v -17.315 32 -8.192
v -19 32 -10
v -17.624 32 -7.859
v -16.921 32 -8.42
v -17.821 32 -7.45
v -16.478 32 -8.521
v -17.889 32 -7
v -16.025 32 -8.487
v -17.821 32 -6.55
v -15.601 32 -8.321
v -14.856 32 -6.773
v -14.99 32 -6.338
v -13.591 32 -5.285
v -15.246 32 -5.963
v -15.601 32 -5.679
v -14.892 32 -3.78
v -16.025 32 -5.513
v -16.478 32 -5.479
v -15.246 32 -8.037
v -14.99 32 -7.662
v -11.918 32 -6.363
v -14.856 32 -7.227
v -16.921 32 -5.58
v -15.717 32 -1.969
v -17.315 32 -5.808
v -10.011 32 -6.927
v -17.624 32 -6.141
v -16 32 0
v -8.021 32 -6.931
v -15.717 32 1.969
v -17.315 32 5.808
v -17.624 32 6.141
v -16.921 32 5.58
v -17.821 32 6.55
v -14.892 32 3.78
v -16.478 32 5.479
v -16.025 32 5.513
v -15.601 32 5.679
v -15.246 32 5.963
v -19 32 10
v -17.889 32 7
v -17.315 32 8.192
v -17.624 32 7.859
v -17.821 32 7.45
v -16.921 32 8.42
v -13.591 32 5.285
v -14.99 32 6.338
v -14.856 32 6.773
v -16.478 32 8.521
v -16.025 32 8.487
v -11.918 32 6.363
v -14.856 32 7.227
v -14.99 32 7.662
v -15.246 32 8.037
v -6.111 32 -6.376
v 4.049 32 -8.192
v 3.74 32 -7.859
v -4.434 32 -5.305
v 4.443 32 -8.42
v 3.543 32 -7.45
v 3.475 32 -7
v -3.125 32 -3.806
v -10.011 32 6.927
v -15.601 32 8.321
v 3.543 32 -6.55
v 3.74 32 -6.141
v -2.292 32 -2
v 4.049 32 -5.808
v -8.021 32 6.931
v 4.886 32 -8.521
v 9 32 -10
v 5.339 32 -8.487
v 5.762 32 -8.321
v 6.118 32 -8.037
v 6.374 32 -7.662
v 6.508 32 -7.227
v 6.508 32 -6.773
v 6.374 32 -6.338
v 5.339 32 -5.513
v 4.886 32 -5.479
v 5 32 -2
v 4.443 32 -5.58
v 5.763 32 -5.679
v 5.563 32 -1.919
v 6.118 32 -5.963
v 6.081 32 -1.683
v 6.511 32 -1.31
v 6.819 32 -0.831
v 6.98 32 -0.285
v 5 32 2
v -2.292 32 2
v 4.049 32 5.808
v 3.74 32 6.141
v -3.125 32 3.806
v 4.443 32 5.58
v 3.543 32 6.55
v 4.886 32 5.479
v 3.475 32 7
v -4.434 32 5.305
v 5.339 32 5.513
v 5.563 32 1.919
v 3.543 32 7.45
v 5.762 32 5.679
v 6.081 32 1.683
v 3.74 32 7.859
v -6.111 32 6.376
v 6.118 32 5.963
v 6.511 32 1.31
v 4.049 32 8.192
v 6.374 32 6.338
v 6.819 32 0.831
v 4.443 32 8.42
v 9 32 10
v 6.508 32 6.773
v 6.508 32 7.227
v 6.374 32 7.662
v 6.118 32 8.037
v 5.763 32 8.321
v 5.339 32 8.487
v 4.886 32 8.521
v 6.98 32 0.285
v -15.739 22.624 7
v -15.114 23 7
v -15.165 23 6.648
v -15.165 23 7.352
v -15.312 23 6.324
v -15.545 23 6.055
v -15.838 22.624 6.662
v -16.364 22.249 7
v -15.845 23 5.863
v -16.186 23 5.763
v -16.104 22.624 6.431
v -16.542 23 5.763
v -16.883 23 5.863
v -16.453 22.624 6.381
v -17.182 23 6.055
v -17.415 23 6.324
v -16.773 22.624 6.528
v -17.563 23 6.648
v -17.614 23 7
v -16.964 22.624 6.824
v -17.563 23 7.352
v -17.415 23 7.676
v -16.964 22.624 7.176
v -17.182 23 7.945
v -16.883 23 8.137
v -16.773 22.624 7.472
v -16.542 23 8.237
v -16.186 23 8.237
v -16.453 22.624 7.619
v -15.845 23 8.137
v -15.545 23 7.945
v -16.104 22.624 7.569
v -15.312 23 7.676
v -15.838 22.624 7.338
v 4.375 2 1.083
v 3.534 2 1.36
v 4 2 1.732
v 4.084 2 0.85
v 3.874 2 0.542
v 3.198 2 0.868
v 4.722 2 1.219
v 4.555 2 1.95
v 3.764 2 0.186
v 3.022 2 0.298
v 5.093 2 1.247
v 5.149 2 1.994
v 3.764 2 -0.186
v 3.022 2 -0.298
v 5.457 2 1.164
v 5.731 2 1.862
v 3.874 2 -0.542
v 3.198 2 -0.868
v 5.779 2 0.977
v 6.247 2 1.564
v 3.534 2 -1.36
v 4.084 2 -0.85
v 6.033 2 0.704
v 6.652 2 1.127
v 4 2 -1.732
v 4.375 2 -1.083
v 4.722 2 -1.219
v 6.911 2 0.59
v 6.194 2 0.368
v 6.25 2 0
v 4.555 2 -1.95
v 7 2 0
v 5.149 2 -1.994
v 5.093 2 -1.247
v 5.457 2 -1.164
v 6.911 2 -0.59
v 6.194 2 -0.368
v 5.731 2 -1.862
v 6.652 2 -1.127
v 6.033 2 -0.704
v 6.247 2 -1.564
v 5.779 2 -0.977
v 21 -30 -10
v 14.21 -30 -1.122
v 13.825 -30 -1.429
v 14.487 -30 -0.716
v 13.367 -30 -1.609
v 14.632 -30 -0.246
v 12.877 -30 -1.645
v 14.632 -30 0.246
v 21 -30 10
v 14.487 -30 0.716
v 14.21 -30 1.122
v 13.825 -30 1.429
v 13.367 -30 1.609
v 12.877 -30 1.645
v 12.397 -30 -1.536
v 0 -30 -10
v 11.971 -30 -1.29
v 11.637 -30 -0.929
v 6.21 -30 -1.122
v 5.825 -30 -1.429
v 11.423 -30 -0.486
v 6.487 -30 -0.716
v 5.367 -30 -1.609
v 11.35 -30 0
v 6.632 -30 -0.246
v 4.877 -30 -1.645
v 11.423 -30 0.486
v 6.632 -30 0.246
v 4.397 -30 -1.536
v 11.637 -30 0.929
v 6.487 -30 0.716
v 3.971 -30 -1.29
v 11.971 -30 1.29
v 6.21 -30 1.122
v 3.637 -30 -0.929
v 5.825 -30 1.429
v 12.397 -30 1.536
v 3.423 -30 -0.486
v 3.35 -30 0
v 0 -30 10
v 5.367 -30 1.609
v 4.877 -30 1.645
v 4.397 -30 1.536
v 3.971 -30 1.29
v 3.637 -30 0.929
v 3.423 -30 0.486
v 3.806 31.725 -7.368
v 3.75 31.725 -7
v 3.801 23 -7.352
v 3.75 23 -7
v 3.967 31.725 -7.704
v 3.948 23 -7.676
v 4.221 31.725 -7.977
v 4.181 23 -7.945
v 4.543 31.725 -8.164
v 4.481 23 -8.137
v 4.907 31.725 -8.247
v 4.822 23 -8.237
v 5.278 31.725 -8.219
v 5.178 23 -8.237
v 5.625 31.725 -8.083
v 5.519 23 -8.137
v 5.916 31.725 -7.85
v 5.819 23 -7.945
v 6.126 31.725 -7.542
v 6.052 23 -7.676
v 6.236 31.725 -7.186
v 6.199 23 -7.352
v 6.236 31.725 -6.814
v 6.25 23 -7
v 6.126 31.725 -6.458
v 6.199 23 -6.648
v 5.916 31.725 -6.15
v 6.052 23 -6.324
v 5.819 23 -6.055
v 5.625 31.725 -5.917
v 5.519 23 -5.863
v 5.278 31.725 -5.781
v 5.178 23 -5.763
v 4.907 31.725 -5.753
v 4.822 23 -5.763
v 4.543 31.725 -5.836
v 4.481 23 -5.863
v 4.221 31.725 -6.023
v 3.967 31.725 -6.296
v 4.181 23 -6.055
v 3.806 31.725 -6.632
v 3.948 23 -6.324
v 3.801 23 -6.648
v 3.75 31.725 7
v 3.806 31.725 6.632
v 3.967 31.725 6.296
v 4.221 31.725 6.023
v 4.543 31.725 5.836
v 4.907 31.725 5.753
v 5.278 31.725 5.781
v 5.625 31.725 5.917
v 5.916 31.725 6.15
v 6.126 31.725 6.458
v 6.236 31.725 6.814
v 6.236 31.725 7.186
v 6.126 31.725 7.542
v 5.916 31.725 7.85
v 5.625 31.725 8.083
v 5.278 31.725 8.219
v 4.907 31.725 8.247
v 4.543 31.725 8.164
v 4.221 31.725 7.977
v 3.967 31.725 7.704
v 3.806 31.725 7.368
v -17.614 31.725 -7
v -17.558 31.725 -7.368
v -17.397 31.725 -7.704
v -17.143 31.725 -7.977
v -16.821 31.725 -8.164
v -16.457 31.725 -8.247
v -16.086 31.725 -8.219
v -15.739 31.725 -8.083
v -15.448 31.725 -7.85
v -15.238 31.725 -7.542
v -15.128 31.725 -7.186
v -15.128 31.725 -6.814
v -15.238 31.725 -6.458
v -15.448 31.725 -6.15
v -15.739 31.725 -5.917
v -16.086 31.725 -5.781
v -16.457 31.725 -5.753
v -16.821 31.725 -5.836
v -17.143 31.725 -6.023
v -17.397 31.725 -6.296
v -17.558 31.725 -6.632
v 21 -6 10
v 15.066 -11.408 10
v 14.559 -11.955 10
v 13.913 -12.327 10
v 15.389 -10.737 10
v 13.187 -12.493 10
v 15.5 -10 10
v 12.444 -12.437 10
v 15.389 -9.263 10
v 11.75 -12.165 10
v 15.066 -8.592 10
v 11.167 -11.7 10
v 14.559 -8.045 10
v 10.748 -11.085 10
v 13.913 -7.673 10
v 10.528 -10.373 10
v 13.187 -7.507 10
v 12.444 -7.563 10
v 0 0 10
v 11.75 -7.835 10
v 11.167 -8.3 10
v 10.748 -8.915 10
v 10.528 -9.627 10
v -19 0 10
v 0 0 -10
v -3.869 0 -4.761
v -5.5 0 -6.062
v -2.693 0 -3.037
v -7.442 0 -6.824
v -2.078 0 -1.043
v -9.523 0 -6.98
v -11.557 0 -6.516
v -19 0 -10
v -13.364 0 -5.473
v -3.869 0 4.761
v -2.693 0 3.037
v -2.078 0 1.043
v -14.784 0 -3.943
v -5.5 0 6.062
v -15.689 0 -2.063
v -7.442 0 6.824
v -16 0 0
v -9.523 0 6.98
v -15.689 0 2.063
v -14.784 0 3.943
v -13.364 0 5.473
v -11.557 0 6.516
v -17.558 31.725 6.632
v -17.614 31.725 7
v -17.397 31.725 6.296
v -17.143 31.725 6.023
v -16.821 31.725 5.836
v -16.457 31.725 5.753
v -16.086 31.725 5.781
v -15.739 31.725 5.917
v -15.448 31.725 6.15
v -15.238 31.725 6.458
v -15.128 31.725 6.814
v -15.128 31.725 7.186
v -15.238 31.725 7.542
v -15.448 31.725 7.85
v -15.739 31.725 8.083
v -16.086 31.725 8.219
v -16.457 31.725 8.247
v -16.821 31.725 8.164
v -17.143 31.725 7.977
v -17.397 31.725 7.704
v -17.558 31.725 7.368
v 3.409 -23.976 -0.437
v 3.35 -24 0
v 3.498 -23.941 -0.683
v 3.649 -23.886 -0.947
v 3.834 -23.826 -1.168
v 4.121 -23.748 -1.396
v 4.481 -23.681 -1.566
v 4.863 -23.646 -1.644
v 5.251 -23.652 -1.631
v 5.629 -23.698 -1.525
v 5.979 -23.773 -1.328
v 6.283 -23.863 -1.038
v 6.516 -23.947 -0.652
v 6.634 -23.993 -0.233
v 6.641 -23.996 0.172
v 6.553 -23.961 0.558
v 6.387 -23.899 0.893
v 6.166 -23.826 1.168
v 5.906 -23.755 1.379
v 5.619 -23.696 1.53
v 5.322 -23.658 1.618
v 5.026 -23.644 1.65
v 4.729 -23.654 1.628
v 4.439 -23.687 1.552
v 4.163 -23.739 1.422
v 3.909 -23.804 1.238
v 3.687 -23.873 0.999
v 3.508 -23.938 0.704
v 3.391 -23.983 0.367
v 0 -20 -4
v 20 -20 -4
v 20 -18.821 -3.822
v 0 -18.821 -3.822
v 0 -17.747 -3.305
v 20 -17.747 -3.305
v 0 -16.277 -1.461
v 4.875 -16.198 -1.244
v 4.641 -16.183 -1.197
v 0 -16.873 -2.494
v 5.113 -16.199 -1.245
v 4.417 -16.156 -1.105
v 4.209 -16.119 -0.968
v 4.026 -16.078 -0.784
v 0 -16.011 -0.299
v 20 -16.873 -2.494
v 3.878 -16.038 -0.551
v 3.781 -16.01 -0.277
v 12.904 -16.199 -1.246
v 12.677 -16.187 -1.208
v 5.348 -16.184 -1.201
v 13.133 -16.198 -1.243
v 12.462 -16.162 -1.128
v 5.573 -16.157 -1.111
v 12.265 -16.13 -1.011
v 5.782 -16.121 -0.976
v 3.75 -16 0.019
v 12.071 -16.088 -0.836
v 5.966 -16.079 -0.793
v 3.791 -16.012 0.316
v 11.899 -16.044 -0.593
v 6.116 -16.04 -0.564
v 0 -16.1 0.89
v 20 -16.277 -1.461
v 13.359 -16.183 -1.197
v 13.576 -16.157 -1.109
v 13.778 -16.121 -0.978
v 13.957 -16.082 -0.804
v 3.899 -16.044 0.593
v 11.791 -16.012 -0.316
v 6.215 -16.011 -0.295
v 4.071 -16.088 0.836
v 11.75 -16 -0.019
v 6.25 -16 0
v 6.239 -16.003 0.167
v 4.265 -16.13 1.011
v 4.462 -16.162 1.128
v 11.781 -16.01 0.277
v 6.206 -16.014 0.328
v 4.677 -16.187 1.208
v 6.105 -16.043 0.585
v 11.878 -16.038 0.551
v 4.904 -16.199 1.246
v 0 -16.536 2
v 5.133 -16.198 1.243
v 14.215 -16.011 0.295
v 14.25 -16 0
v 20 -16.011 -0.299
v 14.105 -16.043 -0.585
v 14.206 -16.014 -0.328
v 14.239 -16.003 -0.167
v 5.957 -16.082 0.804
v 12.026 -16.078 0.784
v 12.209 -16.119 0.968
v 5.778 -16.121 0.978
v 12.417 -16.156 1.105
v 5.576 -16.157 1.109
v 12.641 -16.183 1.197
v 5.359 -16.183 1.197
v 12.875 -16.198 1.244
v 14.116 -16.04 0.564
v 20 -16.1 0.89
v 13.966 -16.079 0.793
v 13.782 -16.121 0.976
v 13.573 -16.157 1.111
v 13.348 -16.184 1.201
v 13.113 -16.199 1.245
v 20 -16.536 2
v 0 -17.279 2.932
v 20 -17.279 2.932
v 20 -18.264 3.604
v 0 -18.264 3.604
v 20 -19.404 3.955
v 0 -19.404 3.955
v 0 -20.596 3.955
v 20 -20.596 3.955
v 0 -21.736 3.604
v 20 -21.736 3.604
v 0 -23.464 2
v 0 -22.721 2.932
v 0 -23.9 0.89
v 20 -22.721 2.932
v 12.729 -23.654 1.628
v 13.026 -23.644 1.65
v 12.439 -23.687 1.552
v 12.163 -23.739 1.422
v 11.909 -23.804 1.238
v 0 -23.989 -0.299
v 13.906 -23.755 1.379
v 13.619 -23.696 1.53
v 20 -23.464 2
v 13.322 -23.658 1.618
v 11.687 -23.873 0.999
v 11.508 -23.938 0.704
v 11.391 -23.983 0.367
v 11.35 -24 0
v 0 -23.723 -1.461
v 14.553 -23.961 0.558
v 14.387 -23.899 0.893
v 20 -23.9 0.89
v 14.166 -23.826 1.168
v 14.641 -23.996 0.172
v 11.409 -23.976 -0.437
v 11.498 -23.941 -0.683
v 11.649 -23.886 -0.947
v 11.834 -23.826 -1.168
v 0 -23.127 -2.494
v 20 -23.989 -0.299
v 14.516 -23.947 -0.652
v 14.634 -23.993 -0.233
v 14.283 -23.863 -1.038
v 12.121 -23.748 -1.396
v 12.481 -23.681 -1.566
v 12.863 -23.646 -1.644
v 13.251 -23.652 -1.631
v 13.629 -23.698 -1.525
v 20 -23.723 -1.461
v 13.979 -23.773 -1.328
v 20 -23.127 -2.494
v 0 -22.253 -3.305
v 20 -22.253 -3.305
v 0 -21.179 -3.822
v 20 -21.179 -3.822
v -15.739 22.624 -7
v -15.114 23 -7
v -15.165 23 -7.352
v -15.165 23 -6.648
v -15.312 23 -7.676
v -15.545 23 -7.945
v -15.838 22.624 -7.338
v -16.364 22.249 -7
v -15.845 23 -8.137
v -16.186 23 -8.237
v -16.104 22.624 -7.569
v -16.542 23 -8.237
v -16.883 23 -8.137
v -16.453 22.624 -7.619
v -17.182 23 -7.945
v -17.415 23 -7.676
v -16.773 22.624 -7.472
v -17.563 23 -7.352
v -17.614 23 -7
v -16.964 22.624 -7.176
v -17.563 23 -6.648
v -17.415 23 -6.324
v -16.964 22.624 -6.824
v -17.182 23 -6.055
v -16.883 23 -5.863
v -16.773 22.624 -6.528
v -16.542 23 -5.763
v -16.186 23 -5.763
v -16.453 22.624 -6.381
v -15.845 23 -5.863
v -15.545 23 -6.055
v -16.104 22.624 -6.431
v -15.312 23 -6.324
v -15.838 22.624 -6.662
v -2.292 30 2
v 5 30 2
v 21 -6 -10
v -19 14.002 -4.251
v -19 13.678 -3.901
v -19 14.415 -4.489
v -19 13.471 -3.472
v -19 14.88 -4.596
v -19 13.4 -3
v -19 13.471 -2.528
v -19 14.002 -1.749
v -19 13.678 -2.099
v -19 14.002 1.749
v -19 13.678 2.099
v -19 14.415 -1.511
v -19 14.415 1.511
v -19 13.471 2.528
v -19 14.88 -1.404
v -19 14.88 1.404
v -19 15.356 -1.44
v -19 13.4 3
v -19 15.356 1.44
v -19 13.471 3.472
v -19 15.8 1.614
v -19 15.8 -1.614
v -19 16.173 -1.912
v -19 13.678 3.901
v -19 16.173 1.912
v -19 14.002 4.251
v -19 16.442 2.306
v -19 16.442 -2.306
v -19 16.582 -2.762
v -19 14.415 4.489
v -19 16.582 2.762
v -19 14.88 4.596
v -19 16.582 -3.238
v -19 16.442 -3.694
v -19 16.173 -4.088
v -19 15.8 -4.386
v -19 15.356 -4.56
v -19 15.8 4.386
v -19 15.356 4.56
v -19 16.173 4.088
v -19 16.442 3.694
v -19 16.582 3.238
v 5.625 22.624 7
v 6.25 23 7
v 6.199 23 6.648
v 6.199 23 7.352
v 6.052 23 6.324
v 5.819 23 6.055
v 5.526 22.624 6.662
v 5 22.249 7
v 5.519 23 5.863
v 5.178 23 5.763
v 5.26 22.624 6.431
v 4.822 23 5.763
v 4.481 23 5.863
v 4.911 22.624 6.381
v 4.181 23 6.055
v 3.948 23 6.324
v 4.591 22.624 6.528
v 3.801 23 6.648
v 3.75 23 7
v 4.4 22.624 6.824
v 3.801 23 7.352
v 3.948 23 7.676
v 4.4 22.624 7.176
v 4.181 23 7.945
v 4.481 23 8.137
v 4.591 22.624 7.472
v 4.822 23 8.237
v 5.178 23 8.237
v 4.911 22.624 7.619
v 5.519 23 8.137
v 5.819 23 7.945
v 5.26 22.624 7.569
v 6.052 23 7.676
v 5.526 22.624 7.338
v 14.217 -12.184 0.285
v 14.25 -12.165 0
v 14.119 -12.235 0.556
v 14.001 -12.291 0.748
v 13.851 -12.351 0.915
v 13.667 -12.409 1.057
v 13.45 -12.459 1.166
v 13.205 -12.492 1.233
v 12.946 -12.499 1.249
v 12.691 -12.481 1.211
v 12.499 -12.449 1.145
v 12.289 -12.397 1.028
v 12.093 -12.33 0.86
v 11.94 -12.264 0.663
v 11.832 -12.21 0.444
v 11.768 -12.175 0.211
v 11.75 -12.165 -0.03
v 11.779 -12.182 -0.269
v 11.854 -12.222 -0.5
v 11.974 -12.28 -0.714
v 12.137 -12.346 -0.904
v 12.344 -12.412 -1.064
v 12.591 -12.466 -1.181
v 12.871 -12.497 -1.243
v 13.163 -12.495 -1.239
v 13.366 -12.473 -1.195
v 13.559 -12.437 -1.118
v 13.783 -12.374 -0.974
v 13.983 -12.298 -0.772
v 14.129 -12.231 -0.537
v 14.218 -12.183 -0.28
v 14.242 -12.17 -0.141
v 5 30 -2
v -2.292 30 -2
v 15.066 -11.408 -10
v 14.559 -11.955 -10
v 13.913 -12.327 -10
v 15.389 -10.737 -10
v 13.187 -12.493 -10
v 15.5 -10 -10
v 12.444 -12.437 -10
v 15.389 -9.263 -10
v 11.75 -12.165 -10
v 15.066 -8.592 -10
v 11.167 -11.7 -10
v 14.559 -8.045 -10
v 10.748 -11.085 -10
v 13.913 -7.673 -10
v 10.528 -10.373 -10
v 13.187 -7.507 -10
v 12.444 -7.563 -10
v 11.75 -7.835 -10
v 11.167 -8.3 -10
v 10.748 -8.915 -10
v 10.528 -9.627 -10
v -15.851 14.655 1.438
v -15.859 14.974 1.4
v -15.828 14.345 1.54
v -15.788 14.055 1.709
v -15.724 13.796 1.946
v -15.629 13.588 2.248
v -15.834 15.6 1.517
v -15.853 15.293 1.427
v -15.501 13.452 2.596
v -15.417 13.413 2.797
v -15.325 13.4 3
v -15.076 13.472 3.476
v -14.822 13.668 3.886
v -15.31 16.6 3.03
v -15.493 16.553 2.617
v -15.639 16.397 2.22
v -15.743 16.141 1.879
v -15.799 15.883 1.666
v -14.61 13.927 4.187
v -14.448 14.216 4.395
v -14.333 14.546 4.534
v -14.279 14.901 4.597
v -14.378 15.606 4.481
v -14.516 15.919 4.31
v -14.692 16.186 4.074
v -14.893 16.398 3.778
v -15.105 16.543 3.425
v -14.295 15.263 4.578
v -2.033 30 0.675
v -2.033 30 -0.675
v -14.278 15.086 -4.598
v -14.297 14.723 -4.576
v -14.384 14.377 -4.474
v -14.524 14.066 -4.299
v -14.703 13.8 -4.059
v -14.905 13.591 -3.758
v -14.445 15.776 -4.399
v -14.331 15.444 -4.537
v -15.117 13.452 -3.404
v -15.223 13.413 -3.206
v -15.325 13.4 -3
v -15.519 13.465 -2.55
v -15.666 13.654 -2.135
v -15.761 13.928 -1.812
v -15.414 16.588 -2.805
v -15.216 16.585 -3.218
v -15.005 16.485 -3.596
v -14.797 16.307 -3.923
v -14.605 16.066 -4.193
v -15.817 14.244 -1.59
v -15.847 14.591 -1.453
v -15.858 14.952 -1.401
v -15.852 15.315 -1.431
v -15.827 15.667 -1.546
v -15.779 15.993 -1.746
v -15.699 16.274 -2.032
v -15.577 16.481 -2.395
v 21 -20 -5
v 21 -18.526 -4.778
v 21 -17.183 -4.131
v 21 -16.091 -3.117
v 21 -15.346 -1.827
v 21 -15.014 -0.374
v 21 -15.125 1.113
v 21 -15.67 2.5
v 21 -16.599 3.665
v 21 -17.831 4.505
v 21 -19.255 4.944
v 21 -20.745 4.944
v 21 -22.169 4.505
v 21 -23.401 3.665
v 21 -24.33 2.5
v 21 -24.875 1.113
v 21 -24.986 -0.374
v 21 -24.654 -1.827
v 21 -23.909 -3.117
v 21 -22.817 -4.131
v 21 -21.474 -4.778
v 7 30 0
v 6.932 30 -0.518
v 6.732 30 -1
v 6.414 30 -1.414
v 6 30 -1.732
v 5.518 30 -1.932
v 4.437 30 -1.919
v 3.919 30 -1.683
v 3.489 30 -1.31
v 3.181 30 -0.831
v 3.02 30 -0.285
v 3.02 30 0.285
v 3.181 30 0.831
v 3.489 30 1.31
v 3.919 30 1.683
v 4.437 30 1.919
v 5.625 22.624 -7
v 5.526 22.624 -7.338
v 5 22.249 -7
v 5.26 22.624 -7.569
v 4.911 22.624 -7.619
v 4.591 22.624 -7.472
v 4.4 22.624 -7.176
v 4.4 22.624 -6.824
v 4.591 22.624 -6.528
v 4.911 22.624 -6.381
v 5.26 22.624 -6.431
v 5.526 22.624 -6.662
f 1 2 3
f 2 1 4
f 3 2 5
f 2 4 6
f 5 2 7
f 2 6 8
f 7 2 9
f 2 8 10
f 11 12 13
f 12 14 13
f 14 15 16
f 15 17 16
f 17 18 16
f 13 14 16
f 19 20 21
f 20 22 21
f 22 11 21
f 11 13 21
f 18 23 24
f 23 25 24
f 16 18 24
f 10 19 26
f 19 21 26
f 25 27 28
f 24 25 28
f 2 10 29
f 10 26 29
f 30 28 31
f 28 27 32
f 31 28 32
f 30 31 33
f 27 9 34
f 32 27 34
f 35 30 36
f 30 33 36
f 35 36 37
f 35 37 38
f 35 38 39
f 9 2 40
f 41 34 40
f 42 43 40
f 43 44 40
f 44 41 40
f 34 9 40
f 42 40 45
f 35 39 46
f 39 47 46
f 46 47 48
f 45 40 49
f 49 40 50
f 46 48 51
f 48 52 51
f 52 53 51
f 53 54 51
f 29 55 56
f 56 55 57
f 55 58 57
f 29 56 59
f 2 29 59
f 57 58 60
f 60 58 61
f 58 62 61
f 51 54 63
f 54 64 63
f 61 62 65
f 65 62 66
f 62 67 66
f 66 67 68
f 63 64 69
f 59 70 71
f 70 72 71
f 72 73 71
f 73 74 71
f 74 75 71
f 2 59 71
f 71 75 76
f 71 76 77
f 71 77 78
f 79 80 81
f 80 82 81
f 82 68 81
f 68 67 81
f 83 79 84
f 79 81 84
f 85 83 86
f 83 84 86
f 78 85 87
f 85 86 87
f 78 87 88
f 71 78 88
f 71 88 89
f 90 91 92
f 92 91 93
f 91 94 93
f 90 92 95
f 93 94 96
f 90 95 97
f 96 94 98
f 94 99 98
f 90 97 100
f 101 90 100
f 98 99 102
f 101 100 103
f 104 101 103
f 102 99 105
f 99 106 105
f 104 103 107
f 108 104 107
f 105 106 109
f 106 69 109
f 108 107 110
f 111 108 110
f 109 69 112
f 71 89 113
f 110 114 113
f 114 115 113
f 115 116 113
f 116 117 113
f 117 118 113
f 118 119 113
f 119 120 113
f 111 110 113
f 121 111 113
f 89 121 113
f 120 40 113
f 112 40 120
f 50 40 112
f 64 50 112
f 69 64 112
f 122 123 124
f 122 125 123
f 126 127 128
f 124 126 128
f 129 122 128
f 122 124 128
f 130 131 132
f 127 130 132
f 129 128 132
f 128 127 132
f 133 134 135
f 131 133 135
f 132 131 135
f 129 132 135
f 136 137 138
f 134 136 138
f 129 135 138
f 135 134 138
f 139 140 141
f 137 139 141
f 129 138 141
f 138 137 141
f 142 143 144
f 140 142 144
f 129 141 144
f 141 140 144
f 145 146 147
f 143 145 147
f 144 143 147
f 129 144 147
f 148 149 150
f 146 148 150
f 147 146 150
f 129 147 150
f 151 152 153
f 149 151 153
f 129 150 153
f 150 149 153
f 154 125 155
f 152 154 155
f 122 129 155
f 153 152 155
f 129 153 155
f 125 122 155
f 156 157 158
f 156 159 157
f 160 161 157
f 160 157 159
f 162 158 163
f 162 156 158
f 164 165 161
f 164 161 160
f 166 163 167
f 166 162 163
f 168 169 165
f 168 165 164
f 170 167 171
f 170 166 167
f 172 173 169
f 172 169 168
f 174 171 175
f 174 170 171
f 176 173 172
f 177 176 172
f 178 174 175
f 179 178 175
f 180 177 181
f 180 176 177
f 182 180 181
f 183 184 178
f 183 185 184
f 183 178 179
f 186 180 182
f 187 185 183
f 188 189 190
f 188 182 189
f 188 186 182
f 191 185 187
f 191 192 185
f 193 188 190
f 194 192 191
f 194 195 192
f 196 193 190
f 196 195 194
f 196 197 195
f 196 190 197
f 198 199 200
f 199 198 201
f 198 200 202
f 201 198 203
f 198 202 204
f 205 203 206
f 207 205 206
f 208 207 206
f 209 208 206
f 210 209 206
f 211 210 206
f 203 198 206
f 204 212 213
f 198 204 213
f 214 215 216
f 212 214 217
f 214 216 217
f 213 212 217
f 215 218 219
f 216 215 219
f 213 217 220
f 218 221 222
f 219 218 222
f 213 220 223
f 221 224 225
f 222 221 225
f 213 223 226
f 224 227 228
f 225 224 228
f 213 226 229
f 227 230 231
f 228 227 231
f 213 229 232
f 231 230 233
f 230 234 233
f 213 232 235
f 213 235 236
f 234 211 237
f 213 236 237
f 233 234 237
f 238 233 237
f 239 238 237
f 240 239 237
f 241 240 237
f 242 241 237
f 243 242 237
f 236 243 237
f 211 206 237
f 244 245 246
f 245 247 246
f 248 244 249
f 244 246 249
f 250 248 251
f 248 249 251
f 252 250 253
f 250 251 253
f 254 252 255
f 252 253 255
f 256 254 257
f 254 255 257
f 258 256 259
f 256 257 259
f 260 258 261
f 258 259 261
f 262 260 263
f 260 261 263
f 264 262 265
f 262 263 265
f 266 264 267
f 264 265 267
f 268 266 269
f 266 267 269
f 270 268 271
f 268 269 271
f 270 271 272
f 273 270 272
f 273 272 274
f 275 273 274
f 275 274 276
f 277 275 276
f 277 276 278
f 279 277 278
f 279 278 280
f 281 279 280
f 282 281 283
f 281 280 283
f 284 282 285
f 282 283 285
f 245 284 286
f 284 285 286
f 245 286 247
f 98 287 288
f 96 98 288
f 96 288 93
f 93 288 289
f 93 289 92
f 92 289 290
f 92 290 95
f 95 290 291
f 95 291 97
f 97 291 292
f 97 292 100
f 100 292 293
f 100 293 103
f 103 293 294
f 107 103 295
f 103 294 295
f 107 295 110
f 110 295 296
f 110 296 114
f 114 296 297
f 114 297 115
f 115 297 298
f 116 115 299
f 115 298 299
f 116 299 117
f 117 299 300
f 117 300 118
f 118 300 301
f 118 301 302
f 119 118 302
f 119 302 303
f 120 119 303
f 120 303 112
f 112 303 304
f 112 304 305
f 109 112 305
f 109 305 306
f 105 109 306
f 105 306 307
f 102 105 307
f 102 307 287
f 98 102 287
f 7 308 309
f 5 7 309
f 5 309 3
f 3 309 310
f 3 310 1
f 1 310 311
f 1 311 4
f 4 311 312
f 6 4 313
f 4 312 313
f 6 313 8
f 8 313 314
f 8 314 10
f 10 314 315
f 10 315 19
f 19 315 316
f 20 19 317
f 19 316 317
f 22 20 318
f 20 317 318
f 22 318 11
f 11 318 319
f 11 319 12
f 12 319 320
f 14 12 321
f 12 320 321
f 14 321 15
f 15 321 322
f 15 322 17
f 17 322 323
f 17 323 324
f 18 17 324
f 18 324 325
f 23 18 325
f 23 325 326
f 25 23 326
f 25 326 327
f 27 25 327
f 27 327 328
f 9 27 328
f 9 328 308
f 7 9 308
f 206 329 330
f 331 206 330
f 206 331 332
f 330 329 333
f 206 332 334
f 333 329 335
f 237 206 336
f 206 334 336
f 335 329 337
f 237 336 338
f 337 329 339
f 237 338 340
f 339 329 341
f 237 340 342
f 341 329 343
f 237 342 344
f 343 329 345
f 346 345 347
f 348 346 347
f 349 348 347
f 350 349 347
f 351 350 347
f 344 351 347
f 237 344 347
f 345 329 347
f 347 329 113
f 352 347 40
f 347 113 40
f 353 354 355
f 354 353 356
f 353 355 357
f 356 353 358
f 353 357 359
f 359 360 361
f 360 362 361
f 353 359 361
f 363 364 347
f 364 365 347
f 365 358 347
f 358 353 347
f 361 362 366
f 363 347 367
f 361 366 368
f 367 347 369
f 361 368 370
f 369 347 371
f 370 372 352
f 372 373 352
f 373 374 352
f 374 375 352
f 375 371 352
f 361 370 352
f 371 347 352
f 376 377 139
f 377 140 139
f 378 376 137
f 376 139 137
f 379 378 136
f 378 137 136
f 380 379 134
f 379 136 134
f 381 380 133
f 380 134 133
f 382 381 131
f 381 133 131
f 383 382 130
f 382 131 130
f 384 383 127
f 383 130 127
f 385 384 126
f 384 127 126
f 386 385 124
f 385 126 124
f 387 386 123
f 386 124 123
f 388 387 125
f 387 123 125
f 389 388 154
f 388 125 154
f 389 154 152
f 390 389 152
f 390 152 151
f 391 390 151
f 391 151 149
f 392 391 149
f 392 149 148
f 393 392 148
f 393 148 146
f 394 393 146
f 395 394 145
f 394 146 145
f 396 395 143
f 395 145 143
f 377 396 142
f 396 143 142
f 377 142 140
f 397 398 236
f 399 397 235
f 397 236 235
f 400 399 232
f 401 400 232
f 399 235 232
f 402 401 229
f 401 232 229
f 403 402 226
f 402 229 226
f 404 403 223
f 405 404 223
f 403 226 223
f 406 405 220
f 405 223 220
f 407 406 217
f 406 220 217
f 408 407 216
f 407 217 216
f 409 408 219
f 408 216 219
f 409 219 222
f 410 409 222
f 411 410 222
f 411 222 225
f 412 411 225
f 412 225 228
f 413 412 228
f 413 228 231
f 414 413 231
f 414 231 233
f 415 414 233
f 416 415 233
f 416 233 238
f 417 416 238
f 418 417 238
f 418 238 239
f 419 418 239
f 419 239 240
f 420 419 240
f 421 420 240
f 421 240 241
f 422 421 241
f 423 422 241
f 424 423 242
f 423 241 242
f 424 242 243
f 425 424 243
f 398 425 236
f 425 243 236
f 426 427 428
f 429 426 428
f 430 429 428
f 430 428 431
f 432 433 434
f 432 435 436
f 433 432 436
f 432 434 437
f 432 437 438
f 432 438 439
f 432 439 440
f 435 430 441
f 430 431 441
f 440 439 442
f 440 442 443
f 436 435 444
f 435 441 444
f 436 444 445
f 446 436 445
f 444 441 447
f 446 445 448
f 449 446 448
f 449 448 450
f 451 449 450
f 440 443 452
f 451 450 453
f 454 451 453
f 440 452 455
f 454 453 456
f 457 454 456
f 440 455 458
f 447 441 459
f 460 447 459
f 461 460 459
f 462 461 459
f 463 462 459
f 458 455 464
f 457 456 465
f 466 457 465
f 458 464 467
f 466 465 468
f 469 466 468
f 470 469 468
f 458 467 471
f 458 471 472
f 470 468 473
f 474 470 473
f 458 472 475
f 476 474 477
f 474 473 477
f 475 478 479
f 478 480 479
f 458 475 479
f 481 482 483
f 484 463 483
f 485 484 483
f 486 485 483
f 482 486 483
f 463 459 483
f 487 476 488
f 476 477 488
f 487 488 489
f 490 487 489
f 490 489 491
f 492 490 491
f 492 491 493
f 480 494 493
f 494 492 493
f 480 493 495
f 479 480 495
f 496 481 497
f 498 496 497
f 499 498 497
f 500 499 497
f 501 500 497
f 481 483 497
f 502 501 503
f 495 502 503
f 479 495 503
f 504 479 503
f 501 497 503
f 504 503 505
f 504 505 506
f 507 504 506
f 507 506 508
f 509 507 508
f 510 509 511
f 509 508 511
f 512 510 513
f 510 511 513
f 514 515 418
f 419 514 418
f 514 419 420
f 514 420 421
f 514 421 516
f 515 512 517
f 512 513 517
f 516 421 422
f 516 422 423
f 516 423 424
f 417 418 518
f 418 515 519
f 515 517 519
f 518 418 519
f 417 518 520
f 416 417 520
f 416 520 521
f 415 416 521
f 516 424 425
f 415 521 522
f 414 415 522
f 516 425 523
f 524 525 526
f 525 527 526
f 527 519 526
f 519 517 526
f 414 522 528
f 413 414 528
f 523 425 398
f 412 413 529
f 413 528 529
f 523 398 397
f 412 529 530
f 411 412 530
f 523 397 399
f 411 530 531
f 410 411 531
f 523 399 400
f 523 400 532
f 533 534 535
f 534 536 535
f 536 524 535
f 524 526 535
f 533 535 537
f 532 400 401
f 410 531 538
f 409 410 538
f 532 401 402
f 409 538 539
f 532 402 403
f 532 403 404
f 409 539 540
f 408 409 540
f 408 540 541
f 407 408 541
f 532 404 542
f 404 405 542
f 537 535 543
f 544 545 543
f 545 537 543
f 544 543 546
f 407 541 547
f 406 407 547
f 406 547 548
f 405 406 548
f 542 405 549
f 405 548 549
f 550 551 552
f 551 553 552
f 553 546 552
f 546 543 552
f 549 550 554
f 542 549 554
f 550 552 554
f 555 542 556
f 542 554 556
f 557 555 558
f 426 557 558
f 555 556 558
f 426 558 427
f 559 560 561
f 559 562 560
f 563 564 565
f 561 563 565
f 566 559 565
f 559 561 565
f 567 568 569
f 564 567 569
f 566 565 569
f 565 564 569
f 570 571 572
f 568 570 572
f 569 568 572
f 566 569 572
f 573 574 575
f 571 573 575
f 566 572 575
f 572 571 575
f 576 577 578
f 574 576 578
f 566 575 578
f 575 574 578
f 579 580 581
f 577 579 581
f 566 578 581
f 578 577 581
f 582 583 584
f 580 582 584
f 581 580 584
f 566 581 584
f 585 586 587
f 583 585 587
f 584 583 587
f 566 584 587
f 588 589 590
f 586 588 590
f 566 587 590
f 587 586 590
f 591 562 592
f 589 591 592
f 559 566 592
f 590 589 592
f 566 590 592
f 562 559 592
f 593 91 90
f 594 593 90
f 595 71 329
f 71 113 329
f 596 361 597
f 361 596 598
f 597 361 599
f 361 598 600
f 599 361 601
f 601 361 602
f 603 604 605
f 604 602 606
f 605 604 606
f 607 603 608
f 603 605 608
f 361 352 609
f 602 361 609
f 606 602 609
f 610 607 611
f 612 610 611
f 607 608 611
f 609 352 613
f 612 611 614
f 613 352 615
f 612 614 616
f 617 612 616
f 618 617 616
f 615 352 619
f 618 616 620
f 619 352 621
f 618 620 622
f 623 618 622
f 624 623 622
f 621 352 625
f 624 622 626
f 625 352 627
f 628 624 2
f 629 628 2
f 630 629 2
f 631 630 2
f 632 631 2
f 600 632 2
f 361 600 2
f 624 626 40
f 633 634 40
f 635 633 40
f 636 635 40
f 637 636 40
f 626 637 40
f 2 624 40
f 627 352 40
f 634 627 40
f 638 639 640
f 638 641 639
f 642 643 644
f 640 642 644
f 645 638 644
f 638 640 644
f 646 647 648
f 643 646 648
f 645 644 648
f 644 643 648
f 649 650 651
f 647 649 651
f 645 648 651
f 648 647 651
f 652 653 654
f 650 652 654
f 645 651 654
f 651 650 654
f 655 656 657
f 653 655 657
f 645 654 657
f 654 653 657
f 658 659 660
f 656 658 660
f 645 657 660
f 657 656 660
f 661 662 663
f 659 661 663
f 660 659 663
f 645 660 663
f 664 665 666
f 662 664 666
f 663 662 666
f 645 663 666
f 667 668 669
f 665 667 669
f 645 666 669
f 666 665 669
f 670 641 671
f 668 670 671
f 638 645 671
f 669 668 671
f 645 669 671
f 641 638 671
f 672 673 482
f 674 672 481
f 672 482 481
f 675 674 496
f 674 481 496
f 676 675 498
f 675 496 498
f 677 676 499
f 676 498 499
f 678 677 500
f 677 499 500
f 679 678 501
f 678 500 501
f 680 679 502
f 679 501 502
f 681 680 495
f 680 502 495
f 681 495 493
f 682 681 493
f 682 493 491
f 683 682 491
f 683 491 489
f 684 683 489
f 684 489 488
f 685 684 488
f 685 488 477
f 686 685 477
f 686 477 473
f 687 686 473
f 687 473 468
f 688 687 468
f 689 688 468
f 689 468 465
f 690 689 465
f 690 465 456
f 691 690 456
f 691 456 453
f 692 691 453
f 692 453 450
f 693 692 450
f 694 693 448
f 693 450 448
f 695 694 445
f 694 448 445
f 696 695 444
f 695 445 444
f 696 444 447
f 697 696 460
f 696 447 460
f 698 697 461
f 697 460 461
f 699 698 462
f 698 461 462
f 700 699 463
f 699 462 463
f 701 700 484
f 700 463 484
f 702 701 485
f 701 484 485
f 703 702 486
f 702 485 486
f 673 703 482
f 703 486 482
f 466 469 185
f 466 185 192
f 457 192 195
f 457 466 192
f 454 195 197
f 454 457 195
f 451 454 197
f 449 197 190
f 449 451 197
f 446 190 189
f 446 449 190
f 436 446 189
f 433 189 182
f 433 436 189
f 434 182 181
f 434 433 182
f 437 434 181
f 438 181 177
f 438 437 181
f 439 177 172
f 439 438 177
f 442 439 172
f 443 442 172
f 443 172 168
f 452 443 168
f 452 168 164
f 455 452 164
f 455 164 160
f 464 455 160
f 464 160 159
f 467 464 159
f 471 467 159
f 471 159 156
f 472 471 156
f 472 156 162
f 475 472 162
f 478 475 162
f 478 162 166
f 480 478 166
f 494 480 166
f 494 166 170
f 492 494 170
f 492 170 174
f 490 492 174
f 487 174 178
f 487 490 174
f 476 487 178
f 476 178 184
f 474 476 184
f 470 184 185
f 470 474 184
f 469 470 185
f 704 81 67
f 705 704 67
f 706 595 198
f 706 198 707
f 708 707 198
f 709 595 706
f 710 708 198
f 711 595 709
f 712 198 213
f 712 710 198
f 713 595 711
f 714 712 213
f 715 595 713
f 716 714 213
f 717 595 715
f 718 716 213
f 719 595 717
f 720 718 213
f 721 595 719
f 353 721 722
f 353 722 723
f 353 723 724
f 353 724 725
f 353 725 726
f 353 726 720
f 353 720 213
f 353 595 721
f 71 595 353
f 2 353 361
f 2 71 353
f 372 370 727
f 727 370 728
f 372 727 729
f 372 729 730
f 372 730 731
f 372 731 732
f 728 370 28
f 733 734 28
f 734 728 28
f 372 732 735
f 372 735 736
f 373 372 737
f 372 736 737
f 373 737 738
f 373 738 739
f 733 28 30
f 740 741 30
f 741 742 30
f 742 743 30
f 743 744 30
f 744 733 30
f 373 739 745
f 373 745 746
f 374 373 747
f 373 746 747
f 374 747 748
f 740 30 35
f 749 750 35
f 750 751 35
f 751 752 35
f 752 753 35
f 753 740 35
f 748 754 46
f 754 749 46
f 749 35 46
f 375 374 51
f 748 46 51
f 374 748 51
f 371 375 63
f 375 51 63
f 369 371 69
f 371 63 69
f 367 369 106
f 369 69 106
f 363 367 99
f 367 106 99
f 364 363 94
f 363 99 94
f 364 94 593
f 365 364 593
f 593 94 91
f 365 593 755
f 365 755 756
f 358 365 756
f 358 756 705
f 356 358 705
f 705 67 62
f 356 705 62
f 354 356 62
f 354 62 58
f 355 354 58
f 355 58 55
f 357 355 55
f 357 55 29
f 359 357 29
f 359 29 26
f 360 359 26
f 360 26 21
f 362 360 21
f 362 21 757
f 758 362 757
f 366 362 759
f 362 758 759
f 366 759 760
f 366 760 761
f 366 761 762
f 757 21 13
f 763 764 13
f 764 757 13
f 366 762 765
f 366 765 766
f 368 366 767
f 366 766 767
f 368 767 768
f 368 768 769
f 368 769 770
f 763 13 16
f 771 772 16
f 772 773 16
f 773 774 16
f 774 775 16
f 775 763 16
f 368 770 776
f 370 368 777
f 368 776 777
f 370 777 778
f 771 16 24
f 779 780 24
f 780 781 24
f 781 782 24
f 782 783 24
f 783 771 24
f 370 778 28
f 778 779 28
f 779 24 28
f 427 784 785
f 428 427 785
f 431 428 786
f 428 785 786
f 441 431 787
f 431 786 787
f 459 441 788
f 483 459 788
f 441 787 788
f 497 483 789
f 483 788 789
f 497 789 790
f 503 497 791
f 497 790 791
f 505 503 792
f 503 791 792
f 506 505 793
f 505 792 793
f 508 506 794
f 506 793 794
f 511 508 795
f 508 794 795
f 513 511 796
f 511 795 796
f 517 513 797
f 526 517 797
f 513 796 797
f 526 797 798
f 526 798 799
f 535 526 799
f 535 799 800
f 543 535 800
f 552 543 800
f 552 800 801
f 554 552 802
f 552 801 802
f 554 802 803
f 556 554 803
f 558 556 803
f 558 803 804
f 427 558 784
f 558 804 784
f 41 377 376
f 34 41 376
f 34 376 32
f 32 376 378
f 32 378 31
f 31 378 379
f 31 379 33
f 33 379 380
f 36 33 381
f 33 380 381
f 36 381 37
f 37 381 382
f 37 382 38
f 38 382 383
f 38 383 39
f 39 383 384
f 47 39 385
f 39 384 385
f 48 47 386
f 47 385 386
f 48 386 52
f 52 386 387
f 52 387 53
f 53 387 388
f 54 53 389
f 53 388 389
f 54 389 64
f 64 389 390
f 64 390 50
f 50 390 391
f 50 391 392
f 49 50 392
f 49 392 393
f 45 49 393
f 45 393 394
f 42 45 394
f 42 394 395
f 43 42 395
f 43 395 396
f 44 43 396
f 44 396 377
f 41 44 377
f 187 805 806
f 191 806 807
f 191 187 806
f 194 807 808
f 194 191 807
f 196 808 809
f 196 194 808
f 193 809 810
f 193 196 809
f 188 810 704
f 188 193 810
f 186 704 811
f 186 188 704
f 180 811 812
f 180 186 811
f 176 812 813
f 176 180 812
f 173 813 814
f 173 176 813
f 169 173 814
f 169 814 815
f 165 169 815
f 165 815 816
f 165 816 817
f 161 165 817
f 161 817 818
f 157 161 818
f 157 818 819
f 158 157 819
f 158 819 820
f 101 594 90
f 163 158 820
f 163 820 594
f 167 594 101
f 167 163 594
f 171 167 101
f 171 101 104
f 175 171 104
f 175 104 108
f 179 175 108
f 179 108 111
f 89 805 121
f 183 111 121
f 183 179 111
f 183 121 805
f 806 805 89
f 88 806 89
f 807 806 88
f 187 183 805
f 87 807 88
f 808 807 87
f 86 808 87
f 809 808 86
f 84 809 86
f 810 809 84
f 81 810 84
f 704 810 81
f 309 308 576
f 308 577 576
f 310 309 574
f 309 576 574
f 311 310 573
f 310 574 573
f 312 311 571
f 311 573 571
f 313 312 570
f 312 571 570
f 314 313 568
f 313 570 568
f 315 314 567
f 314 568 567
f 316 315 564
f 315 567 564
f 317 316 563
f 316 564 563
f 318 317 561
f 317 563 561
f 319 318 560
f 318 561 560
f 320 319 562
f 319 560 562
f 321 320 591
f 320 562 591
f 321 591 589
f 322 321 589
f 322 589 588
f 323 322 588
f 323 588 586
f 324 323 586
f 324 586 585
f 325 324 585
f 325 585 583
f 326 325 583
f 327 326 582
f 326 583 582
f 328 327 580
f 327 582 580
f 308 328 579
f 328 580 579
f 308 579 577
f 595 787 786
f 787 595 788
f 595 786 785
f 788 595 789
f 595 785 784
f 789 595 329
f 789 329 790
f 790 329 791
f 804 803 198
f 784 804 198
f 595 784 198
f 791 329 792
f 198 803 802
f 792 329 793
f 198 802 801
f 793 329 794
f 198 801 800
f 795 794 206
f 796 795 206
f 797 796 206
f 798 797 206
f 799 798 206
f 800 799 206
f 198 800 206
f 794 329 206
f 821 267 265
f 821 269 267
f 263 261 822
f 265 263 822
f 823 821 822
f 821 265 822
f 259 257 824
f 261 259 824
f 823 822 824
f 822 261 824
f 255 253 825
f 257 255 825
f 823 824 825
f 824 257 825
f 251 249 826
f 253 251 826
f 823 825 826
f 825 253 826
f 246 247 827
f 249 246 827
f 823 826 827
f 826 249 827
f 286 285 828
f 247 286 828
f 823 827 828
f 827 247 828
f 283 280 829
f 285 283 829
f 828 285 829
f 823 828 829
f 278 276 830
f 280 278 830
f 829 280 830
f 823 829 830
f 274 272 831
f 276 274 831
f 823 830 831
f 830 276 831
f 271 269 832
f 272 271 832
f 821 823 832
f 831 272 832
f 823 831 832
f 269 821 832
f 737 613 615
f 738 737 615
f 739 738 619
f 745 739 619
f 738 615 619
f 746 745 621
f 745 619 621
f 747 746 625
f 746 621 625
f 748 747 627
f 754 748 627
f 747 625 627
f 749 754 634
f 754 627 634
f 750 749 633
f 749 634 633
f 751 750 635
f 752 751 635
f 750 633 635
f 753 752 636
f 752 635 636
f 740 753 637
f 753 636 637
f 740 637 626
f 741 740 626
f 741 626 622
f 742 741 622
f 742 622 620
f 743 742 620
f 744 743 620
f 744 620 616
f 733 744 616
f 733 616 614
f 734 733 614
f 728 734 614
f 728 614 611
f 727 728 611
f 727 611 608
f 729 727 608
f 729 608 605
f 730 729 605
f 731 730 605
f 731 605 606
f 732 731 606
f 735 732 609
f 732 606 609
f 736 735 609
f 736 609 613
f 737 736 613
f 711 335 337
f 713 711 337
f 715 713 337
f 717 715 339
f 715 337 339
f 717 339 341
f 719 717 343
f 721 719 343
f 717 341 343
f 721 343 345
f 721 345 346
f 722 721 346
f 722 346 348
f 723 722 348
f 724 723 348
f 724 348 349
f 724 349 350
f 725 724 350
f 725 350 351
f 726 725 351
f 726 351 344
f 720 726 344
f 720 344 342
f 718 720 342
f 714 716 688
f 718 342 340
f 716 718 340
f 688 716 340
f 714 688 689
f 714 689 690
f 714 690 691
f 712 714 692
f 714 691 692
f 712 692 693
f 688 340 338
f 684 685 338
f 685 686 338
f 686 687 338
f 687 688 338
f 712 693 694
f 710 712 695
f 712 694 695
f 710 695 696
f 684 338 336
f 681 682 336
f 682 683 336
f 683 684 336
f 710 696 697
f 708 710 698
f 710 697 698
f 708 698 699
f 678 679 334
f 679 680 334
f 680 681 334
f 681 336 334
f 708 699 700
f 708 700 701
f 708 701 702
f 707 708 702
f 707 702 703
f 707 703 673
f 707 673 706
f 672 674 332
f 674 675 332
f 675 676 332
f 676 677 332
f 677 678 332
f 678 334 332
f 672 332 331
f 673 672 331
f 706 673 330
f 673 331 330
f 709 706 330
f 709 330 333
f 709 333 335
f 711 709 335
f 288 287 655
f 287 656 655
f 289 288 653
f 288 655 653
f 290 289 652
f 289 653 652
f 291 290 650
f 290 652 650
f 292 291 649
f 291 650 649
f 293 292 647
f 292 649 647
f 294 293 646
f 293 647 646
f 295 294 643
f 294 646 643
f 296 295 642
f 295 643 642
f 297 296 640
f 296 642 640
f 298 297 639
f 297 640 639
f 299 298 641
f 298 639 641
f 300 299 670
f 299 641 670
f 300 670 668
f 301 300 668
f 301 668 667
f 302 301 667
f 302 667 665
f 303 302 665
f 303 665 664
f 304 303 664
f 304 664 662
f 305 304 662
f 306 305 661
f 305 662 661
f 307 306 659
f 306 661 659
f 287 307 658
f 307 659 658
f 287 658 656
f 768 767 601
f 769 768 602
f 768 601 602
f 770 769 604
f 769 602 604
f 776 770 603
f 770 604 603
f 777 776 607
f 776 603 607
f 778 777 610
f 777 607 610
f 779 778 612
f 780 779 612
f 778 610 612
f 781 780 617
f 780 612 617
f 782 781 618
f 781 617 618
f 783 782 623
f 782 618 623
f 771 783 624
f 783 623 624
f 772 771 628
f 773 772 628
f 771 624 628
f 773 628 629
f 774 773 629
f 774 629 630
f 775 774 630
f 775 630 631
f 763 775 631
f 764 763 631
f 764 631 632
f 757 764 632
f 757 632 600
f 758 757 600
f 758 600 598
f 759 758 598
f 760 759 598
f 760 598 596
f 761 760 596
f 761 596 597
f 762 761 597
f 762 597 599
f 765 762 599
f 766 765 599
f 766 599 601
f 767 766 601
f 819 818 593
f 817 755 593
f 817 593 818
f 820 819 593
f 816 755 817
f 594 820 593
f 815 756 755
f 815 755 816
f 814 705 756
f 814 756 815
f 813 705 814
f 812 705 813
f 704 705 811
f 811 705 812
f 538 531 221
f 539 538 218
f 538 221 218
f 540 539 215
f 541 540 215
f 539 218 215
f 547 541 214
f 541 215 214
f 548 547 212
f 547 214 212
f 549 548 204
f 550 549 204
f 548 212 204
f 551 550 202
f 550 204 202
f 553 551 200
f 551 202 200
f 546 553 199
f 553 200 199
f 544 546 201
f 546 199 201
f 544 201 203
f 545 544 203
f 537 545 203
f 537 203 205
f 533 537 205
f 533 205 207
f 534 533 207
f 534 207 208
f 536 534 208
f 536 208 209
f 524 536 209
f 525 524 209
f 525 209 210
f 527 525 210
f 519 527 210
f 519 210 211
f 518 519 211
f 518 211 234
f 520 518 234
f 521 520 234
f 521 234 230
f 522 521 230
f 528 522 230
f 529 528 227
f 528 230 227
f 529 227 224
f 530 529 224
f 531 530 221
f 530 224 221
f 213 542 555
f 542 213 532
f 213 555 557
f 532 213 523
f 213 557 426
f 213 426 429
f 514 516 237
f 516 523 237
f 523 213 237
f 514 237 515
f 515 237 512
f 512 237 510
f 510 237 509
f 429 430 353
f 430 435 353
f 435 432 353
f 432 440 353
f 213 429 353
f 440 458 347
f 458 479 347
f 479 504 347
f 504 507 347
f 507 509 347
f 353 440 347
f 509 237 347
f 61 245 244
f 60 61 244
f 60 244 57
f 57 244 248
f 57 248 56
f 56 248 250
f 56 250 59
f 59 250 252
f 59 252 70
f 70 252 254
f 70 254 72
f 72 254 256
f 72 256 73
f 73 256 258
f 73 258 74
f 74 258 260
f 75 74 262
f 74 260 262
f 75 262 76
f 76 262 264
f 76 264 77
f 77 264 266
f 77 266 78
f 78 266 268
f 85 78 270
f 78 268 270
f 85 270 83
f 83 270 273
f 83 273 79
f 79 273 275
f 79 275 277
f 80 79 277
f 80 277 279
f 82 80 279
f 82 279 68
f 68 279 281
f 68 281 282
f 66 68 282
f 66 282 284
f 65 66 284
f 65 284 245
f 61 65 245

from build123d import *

# Parameters (mm, degrees)
BOSS_EXTRUDE1_DEPTH         = 10
CUT_EXTRUDE1_DEPTH          = 67.21933252457322
CUT_EXTRUDE2_DEPTH          = 2
M3_TAPPED_HOLE1_D           = 2.5
M3_TAPPED_HOLE1_DEPTH       = 9
M3_TAPPED_HOLE1_CSINK_D     = 3.05
M3_TAPPED_HOLE1_CSINK_ANGLE = 90
M3_TAPPED_HOLE1_TIP         = 0.7510757737844503
SKETCH5_R                   = 2.4999999999999987
CUT_EXTRUDE3_DEPTH          = 44.18564576337837
SKETCH6_R                   = 4
CUT_EXTRUDE4_DEPTH          = 53.191953402799555
CHAMFER1_SIZE               = 1
HOLE1_START                 = 2
HOLE1_OUTLINE_R             = 2
HOLE1_DEPTH                 = 28
HOLE1_START_2               = -16.200329062
HOLE1_2_OUTLINE_R           = 1.25
HOLE1_2_DEPTH               = 18.200329062
CUT_EXTRUDE5_REACH          = 54.192
CUT_EXTRUDE5_END_RADIUS     = 7
SKETCH9_R                   = 1.6000000000000005
M4_TAPPED_HOLE1_REACH       = 68.219
M4_TAPPED_HOLE1_BORE_R      = 1.65
CUT_EXTRUDE6_REACH          = 68.219
CUT_EXTRUDE6_END_RADIUS     = 2.4999999999999987
SKETCH12_R                  = 1.2499999999999991


# Read off the part's stored shape, not the designer's step: Hole1
with BuildPart() as part:
    # Sketch1 → Boss-Extrude1 (new, symmetric)
    with BuildSketch(Plane.XY):
        Polygon((0, 0), (-19.000000000000004, -3.04e-15), (-19, 32), (8.999999999999991, 32), (21, -5.9999999999999964), (21, -29.999999999999996), (3.47e-15, -30), align=None)
    extrude(amount=BOSS_EXTRUDE1_DEPTH, both=True)

    # Sketch2 → Cut-Extrude1 (cut, through all)
    with BuildSketch(Plane(origin=(0, 32, 0), x_dir=(1, 0, 0), z_dir=(0, 1, 0))):
        with BuildLine():
            ThreePointArc((-2.2917960675006315, 2.000000000000001), (-10.010587075047079, 6.926666858146693), (-16, -2.25e-15))
            Line((-16, 0), (-2, 0))
            ThreePointArc((-2, 0), (-2.0733331418533067, 1.0105870750470785), (-2.2917960675006315, 2.000000000000001))
        make_face()
        with BuildLine():
            Line((-2, 0), (-16, 0))
            ThreePointArc((-16, 8.6e-16), (-10.01058707504708, -6.926666858146693), (-2.2917960675006324, -2.0000000000000036))
            ThreePointArc((-2.2917960675006324, -2.0000000000000036), (-2.0733331418533067, -1.0105870750470807), (-2, -1.71e-15))
        make_face()
    extrude(amount=-CUT_EXTRUDE1_DEPTH, mode=Mode.SUBTRACT)

    # Sketch2<3> → Cut-Extrude2 (cut)
    with BuildSketch(Plane(origin=(0, 32, 0), x_dir=(1, 0, 0), z_dir=(0, 1, 0))):
        with BuildLine():
            ThreePointArc((5.000000000000001, 2.0000000000000004), (3.585786437626906, 1.4142135623730954), (3.0000000000000004, 2.4e-16))
            Line((3, 0), (7, 0))
            ThreePointArc((7.000000000000002, 0), (6.414213562373096, 1.4142135623730951), (5.000000000000001, 2.0000000000000004))
        make_face()
        with BuildLine():
            Line((7, 0), (3, 0))
            ThreePointArc((3.0000000000000004, 2.4e-16), (3.585786437626905, -1.4142135623730951), (5.000000000000001, -2.0000000000000004))
            ThreePointArc((5.000000000000001, -2.0000000000000004), (6.414213562373096, -1.4142135623730956), (7.000000000000002, -4.9e-16))
        make_face()
        with BuildLine():
            Line((3, 0), (-2, 0))
            ThreePointArc((-2, -1.71e-15), (-2.0733331418533067, -1.0105870750470807), (-2.2917960675006324, -2.0000000000000036))
            Line((-2.2917960675006315, -2.0000000000000013), (5.000000000000001, -2.0000000000000004))
            ThreePointArc((5.000000000000001, -2.0000000000000004), (3.585786437626905, -1.4142135623730951), (3.0000000000000004, 2.4e-16))
        make_face()
        with BuildLine():
            ThreePointArc((-2.2917960675006315, 2.000000000000001), (-2.0733331418533067, 1.0105870750470785), (-2, 0))
            Line((-2, 0), (3, 0))
            ThreePointArc((3.0000000000000004, 2.4e-16), (3.585786437626906, 1.4142135623730954), (5.000000000000001, 2.0000000000000004))
            Line((5.000000000000001, 2.0000000000000004), (-2.2917960675006315, 2.0000000000000013))
        make_face()
    extrude(amount=-CUT_EXTRUDE2_DEPTH, mode=Mode.SUBTRACT)

    # M3 Tapped Hole1
    with Locations(Plane(origin=(0, 32, 0), x_dir=(1, 0, 0), z_dir=(0, 1, 0))):
        with Locations((-16.363887926, 7), (-16.363887926, -7), (5, -7), (5, 7)):
            CounterSinkHole(M3_TAPPED_HOLE1_D / 2, M3_TAPPED_HOLE1_CSINK_D / 2, depth=M3_TAPPED_HOLE1_DEPTH, counter_sink_angle=M3_TAPPED_HOLE1_CSINK_ANGLE)
            with Locations((0, 0, -(M3_TAPPED_HOLE1_DEPTH + M3_TAPPED_HOLE1_TIP / 2))):  # 118° drill point
                Cone(0, M3_TAPPED_HOLE1_D / 2, M3_TAPPED_HOLE1_TIP, mode=Mode.SUBTRACT)

    # Sketch5 → Cut-Extrude3 (cut, through all)
    with BuildSketch(Plane.XY.offset(10)):
        with Locations((13.000000000000002, -9.999999999999998)):
            Circle(SKETCH5_R)
    extrude(amount=-CUT_EXTRUDE3_DEPTH, mode=Mode.SUBTRACT)

    # Sketch6 → Cut-Extrude4 (cut, through all)
    with BuildSketch(Plane(origin=(21, 0, 0), x_dir=(0, 0, -1), z_dir=(1, 0, 0))):
        with Locations((0, -19.999999999999996)):
            Circle(SKETCH6_R)
    extrude(amount=-CUT_EXTRUDE4_DEPTH, mode=Mode.SUBTRACT)

    # Chamfer1
    chamfer1_edges = [part.edges().sort_by_distance(p)[0] for p in [
        (21, -19.999999999999996, 4),
    ]]
    chamfer(chamfer1_edges, length=CHAMFER1_SIZE)

    # Hole1 outline → Hole1 (cut)
    with BuildSketch(Plane(origin=(0, 0, 0), x_dir=(1, 0, 0), z_dir=(0, 1, 0)).offset(HOLE1_START)):
        with Locations((5, 0)):
            Circle(HOLE1_OUTLINE_R)
    extrude(amount=HOLE1_DEPTH, mode=Mode.SUBTRACT)

    # Hole1 2 outline → Hole1 2 (cut)
    with BuildSketch(Plane(origin=(0, 0, 0), x_dir=(1, 0, 0), z_dir=(0, 1, 0)).offset(HOLE1_START_2)):
        with Locations((5, 0)):
            Circle(HOLE1_2_OUTLINE_R)
    extrude(amount=HOLE1_2_DEPTH, mode=Mode.SUBTRACT)

    # Cut-Extrude5: up to this cylinder (the profile starts outside it)
    cut_extrude5_end = Plane(origin=(-9, 15, 0), z_dir=(0, 1, 0)) * Cylinder(CUT_EXTRUDE5_END_RADIUS, 123.384, mode=Mode.PRIVATE)
    # Sketch9 → Cut-Extrude5 (cut, up to the surface)
    with BuildSketch(Plane.ZY.offset(19.000000000000004), mode=Mode.PRIVATE) as cut_extrude5_sk1:
        with Locations(Location((-2.999999999999998, 15, 0), (0, 0, 270))):
            Circle(SKETCH9_R)
    cut_extrude5_tool1 = extrude(cut_extrude5_sk1.sketch, amount=-CUT_EXTRUDE5_REACH, mode=Mode.PRIVATE) - cut_extrude5_end
    add(cut_extrude5_tool1.solids().sort_by_distance((-19, 15, -3))[0], mode=Mode.SUBTRACT)
    # Sketch9 → Cut-Extrude5 (cut, up to the surface)
    with BuildSketch(Plane.ZY.offset(19.000000000000004), mode=Mode.PRIVATE) as cut_extrude5_sk2:
        with Locations(Location((3.000000000000002, 15, 0), (0, 0, 270))):
            Circle(SKETCH9_R)
    cut_extrude5_tool2 = extrude(cut_extrude5_sk2.sketch, amount=-CUT_EXTRUDE5_REACH, mode=Mode.PRIVATE) - cut_extrude5_end
    add(cut_extrude5_tool2.solids().sort_by_distance((-19, 15, 3))[0], mode=Mode.SUBTRACT)

    # M4 Tapped Hole1 bore → M4 Tapped Hole1 (cut, up to next)
    with BuildSketch(Plane(origin=(4.96e-15, -30, 0), x_dir=(-1, -1.7e-16, 0), z_dir=(1.7e-16, -1, 0)), mode=Mode.PRIVATE) as m4_tapped_hole1_sk1:
        with Locations((-13, 0)):
            Circle(M4_TAPPED_HOLE1_BORE_R)
    m4_tapped_hole1_tool1 = extrude(m4_tapped_hole1_sk1.sketch, amount=-M4_TAPPED_HOLE1_REACH, mode=Mode.PRIVATE) & part.part
    # M4 Tapped Hole1 bore → M4 Tapped Hole1 (cut, up to next)
    with BuildSketch(Plane(origin=(4.96e-15, -30, 0), x_dir=(-1, -1.7e-16, 0), z_dir=(1.7e-16, -1, 0)), mode=Mode.PRIVATE) as m4_tapped_hole1_sk2:
        with Locations((-5, 0)):
            Circle(M4_TAPPED_HOLE1_BORE_R)
    m4_tapped_hole1_tool2 = extrude(m4_tapped_hole1_sk2.sketch, amount=-M4_TAPPED_HOLE1_REACH, mode=Mode.PRIVATE) & part.part
    add(m4_tapped_hole1_tool1.solids().sort_by_distance((13, -30, 0))[0], mode=Mode.SUBTRACT)
    add(m4_tapped_hole1_tool2.solids().sort_by_distance((5, -30, 0))[0], mode=Mode.SUBTRACT)

    # Cut-Extrude6: up to this cylinder (the profile starts outside it)
    cut_extrude6_end = Plane(origin=(13.000000000000002, -9.999999999999998, 0), z_dir=(0, 0, 1)) * Cylinder(CUT_EXTRUDE6_END_RADIUS, 142.438, mode=Mode.PRIVATE)
    # Sketch12 → Cut-Extrude6 (cut, up to the surface)
    with BuildSketch(Plane.XZ.offset(30), mode=Mode.PRIVATE) as cut_extrude6_sk1:
        with Locations((12.999999999999998, 0)):
            Circle(SKETCH12_R)
    cut_extrude6_tool1 = extrude(cut_extrude6_sk1.sketch, amount=-CUT_EXTRUDE6_REACH, mode=Mode.PRIVATE) - cut_extrude6_end
    add(cut_extrude6_tool1.solids().sort_by_distance((13, -30, 0))[0], mode=Mode.SUBTRACT)


solid = part.part
